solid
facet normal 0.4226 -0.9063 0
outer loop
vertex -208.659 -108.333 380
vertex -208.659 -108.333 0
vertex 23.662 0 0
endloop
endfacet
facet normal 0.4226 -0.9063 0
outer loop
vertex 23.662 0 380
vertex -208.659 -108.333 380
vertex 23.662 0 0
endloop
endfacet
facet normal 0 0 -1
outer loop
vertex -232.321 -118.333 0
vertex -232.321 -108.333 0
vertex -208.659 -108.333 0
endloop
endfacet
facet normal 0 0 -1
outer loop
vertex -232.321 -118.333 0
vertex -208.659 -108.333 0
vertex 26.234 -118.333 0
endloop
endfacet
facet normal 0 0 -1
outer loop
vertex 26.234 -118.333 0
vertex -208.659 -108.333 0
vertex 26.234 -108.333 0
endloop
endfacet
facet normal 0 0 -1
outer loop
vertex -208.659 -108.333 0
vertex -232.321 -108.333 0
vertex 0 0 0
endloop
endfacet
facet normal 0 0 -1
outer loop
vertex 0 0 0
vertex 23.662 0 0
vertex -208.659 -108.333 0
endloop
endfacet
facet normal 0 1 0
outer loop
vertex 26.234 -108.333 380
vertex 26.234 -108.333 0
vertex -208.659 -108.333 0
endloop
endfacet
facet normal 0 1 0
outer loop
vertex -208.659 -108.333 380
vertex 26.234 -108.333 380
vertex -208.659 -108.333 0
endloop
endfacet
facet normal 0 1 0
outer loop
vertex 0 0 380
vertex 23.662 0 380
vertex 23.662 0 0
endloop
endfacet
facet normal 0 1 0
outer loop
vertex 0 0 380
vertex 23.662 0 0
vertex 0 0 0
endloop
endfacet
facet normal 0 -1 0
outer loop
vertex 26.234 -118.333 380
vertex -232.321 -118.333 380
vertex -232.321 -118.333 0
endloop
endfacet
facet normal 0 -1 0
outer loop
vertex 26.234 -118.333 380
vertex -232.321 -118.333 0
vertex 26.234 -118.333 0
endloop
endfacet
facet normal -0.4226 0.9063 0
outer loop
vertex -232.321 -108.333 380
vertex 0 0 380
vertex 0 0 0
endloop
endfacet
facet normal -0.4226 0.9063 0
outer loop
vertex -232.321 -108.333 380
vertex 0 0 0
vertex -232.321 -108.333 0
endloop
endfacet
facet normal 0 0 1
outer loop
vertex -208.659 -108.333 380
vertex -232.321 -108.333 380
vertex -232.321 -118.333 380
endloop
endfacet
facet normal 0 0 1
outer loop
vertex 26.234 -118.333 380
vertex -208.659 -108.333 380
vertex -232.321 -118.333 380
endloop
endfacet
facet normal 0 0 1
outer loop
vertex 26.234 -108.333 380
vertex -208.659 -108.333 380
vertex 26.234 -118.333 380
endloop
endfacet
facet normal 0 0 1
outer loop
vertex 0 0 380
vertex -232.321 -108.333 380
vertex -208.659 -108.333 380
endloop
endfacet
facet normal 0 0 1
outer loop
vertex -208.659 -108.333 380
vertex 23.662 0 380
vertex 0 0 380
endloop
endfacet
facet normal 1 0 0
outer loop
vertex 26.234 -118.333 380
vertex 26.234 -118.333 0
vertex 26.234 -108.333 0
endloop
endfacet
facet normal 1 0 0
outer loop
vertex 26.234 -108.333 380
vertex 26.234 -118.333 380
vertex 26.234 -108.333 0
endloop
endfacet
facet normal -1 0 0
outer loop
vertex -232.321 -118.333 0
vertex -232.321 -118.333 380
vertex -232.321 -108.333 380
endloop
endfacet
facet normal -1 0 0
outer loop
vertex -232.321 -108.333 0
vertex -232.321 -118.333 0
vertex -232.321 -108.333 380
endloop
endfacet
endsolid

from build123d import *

# Parameters (mm, degrees)
EXTRUDE_1_DEPTH     = 380
CUT_EXTRUDE_1_DEPTH = 473.016948848


with BuildPart() as part:
    # 草图2 → 凸台-拉伸1 (new body)
    with BuildSketch(Plane.XY):
        Polygon((0, 0), (-253.76618037, -118.333113287), (26.23381963, -118.333113287), (26.23381963, -108.333113287), (-208.659095334, -108.333113287), (23.662015832, 0), align=None)
    extrude(amount=EXTRUDE_1_DEPTH)

    # 草图3 → 切除-拉伸1 (cut, through all)
    with BuildSketch(Plane.XY.offset(380)):
        Polygon((-232.321111165, -108.333113287), (-253.76618037, -118.333113287), (-232.321111165, -118.333113287), align=None)
    extrude(amount=-CUT_EXTRUDE_1_DEPTH, mode=Mode.SUBTRACT)


solid = part.part
